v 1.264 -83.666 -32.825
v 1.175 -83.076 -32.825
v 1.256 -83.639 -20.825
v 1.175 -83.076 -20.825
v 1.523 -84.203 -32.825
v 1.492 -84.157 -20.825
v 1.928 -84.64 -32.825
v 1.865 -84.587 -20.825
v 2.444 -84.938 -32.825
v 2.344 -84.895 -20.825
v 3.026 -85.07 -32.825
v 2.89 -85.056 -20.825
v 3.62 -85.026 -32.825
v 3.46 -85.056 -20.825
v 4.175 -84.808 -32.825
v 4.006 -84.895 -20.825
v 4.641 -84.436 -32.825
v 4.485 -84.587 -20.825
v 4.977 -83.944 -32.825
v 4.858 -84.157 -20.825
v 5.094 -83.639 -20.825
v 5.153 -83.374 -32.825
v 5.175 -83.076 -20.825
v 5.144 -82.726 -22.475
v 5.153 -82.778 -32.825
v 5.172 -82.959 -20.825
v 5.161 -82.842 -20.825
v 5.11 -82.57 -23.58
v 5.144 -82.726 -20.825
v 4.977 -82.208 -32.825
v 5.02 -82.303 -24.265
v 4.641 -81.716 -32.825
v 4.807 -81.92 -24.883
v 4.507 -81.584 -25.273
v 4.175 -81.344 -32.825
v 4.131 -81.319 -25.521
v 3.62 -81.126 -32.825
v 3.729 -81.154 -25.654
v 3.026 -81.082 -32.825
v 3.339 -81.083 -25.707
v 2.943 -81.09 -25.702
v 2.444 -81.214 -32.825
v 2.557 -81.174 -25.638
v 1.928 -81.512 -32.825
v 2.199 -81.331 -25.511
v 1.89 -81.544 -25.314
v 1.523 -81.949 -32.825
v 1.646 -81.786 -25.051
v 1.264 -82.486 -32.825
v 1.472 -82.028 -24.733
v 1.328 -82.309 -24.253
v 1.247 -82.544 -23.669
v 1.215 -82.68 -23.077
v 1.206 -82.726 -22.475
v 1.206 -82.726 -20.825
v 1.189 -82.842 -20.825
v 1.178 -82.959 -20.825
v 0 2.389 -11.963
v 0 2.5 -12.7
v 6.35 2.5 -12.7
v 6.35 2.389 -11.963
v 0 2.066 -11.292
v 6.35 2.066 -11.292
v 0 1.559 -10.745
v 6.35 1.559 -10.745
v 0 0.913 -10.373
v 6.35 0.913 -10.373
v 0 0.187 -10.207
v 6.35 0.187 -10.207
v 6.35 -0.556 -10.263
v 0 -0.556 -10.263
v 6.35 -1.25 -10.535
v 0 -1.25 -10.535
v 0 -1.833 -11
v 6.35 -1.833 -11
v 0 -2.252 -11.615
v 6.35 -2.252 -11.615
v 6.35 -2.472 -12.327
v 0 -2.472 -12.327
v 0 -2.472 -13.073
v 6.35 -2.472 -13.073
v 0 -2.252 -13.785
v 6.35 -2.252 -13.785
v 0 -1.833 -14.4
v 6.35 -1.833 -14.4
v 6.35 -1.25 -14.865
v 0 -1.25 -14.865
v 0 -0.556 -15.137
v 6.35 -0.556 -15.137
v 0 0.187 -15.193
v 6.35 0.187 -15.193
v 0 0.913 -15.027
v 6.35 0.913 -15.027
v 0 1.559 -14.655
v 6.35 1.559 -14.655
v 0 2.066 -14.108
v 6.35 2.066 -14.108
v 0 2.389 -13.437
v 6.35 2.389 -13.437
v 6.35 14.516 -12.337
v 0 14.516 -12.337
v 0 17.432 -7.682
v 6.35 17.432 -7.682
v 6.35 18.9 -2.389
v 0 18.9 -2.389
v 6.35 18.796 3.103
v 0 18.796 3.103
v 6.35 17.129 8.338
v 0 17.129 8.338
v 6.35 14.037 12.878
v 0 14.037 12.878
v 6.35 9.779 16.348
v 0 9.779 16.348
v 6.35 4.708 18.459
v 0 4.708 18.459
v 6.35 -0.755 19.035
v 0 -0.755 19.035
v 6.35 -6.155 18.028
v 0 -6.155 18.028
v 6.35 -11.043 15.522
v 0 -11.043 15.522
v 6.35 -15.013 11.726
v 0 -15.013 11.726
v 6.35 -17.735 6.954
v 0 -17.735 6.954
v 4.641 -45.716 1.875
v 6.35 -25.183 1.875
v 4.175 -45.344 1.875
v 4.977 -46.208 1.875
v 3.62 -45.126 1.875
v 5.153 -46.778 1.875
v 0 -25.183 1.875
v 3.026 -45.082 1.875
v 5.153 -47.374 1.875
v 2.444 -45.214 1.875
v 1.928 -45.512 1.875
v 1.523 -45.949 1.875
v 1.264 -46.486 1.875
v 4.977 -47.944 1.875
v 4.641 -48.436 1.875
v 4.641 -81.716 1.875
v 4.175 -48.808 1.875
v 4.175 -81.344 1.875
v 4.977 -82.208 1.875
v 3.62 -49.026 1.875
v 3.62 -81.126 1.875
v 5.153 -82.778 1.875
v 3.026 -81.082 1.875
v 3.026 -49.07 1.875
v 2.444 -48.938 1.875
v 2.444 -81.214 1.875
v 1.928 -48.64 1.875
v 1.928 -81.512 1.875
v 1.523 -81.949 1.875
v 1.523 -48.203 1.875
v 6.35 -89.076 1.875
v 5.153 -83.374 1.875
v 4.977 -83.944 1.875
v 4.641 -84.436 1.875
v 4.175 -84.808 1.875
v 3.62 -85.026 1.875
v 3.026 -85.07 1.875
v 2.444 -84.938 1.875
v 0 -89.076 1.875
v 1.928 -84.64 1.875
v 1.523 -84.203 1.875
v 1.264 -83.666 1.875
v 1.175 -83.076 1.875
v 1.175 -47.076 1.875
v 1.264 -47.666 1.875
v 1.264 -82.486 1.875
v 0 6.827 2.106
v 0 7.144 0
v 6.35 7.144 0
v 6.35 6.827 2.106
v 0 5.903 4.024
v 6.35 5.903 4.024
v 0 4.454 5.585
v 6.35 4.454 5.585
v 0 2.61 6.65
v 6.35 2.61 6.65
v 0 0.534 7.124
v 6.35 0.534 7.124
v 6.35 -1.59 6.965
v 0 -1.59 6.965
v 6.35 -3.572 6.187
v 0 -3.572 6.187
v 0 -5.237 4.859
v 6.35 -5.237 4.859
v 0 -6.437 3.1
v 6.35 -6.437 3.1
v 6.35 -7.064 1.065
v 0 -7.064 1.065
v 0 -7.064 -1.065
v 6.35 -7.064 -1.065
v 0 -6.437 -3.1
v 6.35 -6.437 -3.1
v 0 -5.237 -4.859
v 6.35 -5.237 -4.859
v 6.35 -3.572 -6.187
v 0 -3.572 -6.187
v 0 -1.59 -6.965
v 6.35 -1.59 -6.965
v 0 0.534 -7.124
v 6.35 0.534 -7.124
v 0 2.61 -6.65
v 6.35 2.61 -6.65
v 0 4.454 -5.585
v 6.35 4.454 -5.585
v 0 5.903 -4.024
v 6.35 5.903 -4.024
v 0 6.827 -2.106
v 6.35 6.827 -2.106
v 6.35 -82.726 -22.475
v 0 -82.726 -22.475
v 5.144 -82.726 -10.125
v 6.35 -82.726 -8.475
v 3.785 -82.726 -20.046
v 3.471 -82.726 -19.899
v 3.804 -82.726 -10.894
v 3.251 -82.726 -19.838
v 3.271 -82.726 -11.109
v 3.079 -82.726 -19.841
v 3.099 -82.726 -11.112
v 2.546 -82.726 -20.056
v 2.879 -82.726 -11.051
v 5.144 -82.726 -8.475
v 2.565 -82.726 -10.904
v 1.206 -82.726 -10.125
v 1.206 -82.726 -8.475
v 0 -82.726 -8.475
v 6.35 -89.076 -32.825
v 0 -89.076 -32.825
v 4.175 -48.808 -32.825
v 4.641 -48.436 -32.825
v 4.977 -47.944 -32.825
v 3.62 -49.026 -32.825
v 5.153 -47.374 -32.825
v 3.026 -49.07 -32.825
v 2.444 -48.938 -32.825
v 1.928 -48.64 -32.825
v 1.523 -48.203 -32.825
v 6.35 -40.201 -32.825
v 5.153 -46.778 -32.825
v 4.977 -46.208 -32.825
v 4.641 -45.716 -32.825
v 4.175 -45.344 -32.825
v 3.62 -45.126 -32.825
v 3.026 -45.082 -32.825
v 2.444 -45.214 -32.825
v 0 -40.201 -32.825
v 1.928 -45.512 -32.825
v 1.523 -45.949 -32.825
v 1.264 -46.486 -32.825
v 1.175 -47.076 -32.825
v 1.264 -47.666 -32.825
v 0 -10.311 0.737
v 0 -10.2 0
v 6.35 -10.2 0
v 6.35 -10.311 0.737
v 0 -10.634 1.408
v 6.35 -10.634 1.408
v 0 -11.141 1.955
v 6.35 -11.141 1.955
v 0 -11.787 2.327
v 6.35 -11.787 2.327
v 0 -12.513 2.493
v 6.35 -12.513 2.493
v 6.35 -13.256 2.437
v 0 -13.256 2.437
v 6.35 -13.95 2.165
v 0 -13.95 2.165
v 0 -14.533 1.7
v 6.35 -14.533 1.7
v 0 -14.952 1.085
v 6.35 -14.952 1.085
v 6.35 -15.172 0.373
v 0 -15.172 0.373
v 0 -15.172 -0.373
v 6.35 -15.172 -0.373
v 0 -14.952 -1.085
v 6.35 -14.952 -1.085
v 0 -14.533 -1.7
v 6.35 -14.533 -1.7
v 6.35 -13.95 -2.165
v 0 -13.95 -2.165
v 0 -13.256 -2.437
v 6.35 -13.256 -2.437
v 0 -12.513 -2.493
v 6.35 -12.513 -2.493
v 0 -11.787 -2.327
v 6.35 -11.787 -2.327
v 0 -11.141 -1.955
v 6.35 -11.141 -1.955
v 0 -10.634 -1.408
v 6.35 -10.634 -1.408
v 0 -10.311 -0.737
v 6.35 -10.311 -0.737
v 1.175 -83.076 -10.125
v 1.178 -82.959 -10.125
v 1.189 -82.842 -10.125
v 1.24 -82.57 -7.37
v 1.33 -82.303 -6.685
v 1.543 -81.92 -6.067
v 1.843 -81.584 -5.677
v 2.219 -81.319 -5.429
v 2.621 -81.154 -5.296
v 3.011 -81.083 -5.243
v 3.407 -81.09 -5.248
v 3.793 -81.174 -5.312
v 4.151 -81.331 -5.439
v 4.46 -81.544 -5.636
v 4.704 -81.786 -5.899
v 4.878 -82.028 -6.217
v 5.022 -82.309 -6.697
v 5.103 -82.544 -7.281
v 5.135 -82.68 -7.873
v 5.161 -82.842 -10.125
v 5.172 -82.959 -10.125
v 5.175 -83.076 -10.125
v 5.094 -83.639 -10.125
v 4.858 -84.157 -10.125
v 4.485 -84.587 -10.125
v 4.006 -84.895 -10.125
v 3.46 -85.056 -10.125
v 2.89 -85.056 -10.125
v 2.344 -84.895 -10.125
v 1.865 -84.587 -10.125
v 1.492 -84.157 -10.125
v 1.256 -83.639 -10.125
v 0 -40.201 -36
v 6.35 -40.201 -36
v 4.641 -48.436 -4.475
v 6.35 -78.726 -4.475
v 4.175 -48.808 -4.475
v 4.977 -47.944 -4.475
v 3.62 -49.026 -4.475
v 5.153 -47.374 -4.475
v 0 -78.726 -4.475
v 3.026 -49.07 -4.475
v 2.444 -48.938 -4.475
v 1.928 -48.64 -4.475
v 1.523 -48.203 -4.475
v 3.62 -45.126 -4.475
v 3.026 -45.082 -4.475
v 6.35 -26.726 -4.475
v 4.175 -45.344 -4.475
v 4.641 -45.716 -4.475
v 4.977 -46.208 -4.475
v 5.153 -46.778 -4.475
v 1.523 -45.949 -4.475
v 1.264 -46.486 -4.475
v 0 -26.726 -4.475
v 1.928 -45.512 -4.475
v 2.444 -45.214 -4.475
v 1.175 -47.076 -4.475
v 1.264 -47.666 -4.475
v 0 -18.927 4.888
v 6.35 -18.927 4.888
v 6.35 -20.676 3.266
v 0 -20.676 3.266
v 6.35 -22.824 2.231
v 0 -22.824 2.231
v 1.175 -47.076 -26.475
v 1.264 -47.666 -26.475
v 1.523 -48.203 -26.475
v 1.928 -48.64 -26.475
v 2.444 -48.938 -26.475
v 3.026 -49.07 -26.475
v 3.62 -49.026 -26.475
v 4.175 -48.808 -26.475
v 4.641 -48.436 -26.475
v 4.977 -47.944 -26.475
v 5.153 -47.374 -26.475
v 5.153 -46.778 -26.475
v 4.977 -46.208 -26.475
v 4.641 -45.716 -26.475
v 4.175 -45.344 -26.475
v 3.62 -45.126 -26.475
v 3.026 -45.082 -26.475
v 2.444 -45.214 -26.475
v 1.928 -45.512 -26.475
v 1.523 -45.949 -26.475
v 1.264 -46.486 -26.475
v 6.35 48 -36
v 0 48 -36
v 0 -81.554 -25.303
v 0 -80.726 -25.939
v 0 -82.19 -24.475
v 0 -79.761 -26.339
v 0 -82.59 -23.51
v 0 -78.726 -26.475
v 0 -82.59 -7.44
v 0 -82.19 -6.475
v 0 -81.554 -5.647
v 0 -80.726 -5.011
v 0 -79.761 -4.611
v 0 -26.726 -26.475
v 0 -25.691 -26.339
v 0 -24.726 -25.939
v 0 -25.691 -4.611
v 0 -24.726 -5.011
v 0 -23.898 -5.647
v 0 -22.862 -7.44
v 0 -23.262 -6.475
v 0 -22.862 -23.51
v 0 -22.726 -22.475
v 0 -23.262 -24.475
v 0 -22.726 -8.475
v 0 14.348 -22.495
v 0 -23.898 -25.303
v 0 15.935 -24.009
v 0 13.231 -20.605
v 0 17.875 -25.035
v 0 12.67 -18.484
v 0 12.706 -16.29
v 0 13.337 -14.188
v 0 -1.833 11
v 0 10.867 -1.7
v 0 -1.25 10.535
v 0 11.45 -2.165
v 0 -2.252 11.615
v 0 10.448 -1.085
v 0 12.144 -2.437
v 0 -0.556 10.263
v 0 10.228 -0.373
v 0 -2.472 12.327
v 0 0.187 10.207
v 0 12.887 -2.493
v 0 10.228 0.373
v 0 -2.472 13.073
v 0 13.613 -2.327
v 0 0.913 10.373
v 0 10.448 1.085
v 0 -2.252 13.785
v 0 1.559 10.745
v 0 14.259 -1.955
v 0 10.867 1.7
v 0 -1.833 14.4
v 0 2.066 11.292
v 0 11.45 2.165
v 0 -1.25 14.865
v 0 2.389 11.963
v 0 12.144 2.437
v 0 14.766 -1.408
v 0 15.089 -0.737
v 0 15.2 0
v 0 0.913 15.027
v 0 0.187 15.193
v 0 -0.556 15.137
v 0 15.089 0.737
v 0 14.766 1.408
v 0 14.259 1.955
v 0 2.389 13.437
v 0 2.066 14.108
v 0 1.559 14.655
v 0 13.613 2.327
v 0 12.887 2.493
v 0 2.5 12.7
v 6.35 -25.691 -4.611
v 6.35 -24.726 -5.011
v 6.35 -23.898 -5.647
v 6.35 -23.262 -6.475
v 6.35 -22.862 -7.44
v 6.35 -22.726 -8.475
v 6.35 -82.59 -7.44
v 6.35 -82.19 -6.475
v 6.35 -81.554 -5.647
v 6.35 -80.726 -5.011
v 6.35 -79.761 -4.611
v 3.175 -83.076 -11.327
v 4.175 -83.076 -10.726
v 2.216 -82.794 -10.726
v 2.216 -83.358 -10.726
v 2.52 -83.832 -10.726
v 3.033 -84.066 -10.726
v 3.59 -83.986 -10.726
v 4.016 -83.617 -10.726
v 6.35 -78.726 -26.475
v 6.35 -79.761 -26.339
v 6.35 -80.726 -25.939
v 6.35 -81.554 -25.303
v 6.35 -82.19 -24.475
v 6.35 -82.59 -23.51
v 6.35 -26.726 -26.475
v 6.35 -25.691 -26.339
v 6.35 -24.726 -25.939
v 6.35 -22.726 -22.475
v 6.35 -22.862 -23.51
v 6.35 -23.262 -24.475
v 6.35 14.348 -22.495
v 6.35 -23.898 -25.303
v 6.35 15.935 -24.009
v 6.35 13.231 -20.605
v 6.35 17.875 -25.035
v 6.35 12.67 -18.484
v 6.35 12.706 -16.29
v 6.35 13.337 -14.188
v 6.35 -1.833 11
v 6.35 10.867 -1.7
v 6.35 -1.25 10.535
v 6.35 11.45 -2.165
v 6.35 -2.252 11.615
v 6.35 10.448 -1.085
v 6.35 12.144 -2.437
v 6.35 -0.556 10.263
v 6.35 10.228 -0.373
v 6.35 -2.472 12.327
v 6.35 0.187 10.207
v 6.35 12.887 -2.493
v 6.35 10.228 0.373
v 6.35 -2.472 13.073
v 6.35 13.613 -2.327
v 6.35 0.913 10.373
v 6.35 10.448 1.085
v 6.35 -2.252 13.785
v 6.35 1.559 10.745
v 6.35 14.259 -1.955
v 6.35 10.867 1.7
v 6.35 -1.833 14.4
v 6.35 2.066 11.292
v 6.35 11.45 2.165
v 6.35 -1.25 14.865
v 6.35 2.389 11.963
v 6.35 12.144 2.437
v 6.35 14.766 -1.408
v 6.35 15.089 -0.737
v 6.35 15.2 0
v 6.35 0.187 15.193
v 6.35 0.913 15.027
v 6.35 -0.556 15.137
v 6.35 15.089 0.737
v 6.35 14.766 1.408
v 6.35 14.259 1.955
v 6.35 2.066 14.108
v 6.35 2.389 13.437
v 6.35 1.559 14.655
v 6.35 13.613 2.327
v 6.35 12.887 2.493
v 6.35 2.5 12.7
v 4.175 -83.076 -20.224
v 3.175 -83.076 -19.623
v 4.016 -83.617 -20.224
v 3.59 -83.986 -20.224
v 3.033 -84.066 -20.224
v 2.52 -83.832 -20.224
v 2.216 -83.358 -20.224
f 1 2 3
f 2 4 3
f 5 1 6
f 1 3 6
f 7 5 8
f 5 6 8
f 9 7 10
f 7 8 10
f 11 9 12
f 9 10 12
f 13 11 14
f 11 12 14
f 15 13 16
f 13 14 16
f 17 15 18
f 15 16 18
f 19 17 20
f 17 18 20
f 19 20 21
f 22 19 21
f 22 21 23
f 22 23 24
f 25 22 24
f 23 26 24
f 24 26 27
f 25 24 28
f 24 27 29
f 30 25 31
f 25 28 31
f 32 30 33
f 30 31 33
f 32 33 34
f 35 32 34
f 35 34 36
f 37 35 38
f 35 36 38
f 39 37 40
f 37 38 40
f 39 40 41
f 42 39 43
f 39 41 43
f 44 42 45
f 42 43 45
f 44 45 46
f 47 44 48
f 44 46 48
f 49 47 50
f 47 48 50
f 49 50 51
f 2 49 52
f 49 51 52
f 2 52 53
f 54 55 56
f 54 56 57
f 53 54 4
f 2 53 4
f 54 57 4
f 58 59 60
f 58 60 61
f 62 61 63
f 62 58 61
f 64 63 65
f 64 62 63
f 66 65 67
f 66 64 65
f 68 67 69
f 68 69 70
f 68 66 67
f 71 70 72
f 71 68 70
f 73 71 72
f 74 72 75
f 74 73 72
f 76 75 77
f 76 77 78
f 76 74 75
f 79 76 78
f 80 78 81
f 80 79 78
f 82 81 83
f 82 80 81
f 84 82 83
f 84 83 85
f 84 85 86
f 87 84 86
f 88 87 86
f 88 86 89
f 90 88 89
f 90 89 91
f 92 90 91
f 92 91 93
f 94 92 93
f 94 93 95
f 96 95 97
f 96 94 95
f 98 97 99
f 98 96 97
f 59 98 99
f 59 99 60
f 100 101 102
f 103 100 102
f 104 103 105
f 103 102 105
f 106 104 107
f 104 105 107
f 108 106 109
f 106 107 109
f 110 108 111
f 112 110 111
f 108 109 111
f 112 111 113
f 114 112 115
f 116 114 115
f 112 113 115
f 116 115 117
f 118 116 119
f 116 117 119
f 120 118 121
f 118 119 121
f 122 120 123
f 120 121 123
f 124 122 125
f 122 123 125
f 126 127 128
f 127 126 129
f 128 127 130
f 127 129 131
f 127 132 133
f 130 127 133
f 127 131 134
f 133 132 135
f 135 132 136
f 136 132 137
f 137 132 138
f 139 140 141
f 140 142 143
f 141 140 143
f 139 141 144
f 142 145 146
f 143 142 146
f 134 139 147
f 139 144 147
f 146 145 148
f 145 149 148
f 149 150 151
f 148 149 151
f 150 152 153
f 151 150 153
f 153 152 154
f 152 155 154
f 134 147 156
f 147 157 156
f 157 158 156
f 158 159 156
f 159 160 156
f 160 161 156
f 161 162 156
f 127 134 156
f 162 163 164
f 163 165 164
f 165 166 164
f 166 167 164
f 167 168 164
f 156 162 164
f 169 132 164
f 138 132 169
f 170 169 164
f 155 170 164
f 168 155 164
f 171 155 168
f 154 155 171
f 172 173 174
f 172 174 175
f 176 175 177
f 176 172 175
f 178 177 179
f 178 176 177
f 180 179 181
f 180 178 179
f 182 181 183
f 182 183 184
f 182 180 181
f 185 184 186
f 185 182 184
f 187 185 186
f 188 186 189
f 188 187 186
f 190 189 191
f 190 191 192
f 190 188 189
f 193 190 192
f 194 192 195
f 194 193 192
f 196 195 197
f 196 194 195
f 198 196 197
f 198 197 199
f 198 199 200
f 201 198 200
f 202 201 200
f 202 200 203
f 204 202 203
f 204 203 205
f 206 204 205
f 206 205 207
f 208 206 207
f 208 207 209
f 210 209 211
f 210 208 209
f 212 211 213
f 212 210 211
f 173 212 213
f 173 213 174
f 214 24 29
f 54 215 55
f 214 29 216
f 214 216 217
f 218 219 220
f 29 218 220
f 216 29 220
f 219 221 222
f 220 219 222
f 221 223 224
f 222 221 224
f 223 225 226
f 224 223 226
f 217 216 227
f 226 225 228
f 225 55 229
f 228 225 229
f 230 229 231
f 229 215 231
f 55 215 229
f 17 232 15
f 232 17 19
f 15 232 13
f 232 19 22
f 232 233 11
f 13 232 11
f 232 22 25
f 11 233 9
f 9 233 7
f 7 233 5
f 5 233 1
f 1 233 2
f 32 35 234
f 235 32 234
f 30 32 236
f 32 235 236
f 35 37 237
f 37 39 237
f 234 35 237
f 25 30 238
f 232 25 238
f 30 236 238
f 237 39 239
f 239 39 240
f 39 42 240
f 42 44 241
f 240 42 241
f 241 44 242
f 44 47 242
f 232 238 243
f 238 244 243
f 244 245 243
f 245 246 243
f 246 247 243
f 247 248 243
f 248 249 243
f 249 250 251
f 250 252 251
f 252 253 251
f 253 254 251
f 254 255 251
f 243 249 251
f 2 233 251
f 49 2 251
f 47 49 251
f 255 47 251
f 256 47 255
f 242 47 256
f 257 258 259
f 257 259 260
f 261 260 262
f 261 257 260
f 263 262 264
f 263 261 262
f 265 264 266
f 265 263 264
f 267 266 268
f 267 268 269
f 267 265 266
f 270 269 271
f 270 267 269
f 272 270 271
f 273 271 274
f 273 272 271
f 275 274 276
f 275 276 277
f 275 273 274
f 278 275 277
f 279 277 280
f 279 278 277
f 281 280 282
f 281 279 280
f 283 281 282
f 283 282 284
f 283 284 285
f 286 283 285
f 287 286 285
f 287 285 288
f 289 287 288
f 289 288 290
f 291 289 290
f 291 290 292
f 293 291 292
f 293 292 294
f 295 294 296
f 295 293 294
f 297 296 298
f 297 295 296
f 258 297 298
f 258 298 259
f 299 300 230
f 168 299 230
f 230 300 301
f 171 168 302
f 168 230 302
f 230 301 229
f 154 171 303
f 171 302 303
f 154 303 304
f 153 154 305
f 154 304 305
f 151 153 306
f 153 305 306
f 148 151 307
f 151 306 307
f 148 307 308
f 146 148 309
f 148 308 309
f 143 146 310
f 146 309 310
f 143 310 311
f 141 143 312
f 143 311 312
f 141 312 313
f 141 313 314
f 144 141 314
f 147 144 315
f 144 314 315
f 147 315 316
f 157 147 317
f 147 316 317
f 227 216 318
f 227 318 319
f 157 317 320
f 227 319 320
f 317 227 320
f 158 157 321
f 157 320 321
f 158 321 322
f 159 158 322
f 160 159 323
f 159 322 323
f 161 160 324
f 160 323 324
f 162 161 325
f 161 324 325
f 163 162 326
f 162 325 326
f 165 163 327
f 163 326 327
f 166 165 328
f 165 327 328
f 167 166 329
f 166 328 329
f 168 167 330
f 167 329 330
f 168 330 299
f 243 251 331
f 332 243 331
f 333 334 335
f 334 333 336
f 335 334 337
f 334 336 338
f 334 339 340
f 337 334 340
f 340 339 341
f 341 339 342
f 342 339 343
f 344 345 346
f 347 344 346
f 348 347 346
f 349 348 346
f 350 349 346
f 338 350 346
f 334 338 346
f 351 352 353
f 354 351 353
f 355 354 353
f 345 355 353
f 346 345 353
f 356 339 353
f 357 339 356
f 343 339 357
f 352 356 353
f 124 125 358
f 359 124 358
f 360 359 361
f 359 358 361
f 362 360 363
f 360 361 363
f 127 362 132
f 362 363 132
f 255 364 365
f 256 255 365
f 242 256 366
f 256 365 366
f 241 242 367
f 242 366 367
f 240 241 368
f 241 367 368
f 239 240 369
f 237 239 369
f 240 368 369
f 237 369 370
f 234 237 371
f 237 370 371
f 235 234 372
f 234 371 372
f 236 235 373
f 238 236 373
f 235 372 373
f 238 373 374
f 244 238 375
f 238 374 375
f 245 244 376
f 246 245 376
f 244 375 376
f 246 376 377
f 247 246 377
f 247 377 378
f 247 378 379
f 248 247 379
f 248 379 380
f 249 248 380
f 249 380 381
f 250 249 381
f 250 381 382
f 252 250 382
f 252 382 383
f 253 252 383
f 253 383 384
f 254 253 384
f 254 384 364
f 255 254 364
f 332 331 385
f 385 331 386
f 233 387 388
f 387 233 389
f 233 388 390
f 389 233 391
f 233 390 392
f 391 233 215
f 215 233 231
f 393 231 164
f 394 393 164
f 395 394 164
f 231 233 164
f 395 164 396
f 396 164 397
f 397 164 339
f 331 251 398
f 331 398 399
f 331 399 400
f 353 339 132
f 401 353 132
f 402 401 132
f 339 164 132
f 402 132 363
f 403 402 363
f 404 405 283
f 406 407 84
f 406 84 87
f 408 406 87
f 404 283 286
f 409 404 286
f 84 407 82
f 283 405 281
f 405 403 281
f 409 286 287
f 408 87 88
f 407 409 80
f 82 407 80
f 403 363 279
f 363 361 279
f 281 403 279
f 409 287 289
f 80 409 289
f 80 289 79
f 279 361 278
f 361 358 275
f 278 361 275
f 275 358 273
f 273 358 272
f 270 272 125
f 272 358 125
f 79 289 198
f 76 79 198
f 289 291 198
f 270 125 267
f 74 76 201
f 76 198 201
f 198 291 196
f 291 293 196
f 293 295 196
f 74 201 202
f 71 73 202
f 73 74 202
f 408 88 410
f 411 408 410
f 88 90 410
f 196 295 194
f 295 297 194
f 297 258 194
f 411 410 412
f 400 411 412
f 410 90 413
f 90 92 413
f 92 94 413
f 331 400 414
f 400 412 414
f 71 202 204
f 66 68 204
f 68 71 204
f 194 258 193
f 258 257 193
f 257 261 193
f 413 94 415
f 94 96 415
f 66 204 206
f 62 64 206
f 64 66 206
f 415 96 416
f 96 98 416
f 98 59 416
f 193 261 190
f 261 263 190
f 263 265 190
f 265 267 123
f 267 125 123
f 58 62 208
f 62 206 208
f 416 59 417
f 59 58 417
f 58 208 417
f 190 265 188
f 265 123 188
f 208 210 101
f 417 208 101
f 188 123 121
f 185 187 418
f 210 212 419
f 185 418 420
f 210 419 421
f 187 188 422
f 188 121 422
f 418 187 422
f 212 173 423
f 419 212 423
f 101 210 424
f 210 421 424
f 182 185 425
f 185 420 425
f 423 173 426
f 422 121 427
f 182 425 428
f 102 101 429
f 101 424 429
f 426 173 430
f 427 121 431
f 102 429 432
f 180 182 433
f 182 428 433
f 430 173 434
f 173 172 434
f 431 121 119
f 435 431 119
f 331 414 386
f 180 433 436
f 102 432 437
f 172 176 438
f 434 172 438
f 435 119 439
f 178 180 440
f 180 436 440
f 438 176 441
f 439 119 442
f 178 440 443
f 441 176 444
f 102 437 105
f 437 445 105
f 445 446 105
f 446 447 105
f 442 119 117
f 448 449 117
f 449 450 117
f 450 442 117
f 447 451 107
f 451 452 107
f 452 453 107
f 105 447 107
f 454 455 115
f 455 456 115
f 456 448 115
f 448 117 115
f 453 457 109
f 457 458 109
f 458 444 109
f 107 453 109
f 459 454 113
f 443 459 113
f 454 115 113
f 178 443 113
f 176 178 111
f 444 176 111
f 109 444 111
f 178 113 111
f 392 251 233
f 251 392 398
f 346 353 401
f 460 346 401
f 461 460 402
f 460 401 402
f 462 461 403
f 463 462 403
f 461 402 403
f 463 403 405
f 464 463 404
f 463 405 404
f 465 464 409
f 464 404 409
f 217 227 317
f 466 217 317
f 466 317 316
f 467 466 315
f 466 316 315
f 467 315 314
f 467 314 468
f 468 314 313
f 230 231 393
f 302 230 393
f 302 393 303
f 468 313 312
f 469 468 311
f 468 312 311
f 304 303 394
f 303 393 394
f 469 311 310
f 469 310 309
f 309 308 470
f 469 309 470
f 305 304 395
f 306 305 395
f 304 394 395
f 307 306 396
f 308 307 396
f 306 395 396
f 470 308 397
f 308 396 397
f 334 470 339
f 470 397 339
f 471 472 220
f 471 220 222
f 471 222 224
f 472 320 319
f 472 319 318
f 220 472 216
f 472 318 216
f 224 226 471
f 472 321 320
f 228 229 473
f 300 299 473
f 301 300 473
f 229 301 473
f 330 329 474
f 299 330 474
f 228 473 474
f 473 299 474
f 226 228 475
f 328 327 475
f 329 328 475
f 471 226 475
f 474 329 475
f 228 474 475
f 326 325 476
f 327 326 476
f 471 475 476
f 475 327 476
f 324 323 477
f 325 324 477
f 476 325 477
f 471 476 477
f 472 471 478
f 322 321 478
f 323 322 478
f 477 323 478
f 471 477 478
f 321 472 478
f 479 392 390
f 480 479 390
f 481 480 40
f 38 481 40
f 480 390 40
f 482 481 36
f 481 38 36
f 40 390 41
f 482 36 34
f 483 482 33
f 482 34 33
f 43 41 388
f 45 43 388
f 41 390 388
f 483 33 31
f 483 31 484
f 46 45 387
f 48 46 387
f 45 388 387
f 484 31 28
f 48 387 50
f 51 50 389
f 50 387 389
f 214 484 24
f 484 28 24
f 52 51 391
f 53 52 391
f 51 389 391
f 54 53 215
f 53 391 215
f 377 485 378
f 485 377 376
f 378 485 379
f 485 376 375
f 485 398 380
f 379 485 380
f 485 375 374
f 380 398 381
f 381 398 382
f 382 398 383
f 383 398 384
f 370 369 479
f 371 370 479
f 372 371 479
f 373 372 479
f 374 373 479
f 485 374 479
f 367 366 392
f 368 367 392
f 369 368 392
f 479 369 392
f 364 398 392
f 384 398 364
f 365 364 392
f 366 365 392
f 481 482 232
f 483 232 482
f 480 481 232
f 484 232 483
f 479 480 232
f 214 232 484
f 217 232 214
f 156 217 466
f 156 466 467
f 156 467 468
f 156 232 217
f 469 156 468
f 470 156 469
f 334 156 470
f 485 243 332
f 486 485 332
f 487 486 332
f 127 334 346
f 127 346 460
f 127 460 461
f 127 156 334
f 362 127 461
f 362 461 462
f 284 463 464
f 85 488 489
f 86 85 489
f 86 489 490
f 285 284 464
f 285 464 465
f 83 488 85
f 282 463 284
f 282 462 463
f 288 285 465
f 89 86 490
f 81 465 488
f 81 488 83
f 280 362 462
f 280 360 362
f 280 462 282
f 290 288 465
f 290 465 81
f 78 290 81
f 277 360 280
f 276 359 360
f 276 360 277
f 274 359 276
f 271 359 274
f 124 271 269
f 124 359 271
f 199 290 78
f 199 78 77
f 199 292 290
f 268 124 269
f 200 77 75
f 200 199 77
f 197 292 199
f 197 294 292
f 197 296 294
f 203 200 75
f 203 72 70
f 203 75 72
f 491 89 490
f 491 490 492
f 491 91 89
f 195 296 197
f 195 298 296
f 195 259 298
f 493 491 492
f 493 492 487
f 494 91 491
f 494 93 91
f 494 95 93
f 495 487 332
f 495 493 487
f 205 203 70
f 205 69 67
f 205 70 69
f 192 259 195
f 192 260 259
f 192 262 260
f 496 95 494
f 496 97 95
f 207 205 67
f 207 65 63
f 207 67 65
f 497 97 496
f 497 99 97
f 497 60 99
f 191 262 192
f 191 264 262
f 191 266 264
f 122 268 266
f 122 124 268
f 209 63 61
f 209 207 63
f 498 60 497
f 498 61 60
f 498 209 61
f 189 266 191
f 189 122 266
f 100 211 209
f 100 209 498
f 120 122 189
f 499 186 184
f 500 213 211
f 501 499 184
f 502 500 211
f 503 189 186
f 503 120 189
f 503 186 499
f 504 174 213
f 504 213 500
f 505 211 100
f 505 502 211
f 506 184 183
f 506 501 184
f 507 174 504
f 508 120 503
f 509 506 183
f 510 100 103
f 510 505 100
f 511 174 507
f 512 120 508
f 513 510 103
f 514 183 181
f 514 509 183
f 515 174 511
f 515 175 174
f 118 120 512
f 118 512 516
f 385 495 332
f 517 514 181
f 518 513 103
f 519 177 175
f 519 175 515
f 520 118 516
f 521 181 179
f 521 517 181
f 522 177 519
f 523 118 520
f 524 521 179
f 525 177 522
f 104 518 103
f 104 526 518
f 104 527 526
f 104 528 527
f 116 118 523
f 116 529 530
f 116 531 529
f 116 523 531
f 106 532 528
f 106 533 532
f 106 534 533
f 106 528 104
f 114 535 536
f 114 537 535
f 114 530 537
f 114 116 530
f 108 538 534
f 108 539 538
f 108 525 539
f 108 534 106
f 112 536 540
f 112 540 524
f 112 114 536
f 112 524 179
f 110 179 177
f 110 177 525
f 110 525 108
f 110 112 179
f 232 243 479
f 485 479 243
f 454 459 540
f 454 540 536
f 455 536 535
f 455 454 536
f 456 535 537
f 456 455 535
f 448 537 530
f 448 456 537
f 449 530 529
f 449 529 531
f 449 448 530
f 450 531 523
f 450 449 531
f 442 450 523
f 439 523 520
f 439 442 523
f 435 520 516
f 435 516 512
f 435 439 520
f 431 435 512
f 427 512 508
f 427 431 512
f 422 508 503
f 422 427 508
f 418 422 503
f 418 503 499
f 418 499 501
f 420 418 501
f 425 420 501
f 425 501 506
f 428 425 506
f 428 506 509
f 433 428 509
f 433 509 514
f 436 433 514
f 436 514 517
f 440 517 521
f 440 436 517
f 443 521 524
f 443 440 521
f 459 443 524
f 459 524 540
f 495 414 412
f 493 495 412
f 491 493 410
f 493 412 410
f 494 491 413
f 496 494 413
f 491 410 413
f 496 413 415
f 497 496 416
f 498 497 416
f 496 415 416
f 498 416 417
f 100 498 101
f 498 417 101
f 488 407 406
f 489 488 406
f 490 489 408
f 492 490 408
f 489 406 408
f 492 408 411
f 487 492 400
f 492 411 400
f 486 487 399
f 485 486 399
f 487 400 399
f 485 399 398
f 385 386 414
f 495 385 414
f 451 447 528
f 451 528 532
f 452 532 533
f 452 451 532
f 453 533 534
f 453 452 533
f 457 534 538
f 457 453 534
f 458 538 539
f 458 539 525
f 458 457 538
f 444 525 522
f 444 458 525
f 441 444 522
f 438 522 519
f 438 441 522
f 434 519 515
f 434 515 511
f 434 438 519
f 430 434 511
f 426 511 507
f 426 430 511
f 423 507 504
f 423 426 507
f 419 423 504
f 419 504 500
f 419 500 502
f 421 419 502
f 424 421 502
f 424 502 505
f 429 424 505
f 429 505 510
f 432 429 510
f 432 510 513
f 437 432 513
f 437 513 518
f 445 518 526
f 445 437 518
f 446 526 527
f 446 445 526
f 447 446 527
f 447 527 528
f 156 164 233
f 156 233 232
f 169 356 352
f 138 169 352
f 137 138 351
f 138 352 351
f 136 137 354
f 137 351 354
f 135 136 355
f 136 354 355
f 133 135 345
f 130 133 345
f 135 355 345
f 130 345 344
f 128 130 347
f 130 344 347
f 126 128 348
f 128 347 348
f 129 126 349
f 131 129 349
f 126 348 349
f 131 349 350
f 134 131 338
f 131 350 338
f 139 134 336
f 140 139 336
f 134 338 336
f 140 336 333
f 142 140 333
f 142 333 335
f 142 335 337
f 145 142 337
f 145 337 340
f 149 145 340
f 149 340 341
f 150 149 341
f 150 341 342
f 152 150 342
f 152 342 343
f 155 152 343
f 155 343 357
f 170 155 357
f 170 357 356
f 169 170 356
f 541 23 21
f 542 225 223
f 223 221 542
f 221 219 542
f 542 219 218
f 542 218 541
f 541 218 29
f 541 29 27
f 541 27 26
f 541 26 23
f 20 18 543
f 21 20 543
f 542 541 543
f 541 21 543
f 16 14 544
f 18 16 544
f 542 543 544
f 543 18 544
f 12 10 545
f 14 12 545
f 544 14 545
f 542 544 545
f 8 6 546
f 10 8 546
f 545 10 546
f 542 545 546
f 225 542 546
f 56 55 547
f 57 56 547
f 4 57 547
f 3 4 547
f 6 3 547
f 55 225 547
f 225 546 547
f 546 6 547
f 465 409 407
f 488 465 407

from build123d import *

# Parameters (mm, degrees)
F0_R     = 2.5
F0_R_2   = 7.144
F1_DEPTH = 6.35
F2_W     = 6.35
F2_H     = 38
F3_DEPTH = 37.876
F5_D     = 4
F5_DEPTH = 12
F5_TIP   = 1.2017212381
F7_D     = 4
F7_DEPTH = 12
F7_TIP   = 1.2017212381


with BuildPart() as f1:
    # F0 (on Right) → F1 (new body)
    with BuildSketch(Plane.YZ):
        with BuildLine():
            ThreePointArc((17.8751346366, -25.0354456965), (12.8773903734, -19.5640491806), (14.5155336292, -12.3370086917))
            ThreePointArc((14.5155336292, -12.3370086917), (9.7791608288, 16.348410121), (-17.735210007, 6.9544824399))
            ThreePointArc((-17.735210007, 6.9544824399), (-20.675525796, 3.2657587243), (-25.1830672278, 1.875))
            Line((-25.1830672278, 1.875), (-127.076, 1.875))
            Line((-127.076, 1.875), (-127.076, -4.475))
            Line((-127.076, -4.475), (-93.076, -4.475))
            ThreePointArc((-93.076, -4.475), (-90.2475728753, -5.6465728753), (-89.076, -8.475))
            Line((-89.076, -8.475), (-89.076, -22.475))
            ThreePointArc((-89.076, -22.475), (-90.2475728753, -25.3034271247), (-93.076, -26.475))
            Line((-93.076, -26.475), (-127.076, -26.475))
            Line((-127.076, -26.475), (-127.076, -32.825))
            Line((-127.076, -32.825), (-40.201, -32.825))
            Line((-40.201, -32.825), (-40.201, -36))
            Line((-40.201, -36), (48, -36))
            Line((48, -36), (17.8751346366, -25.0354456965))
        make_face()
        with BuildLine():
            ThreePointArc((-82.726, -8.475), (-81.5544271247, -5.6465728753), (-78.726, -4.475))
            Line((-78.726, -4.475), (-26.726, -4.475))
            ThreePointArc((-26.726, -4.475), (-23.8975728753, -5.6465728753), (-22.726, -8.475))
            Line((-22.726, -8.475), (-22.726, -22.475))
            ThreePointArc((-22.726, -22.475), (-23.8975728753, -25.3034271247), (-26.726, -26.475))
            Line((-26.726, -26.475), (-78.726, -26.475))
            ThreePointArc((-78.726, -26.475), (-81.5544271247, -25.3034271247), (-82.726, -22.475))
            Line((-82.726, -22.475), (-82.726, -8.475))
        make_face(mode=Mode.SUBTRACT)
        with Locations((0, -12.7)):
            Circle(F0_R, mode=Mode.SUBTRACT)
        with Locations((-12.7, 0)):
            Circle(F0_R, mode=Mode.SUBTRACT)
        Circle(F0_R_2, mode=Mode.SUBTRACT)
        with Locations((12.7, 0)):
            Circle(F0_R, mode=Mode.SUBTRACT)
        with Locations((0, 12.7)):
            Circle(F0_R, mode=Mode.SUBTRACT)
    extrude(amount=F1_DEPTH)

    # F2 (on face) → F3 (cut, through all)
    with BuildSketch(Plane.XY.offset(1.875)):
        with Locations((3.175, -108.076)):
            Rectangle(F2_W, F2_H)
    extrude(amount=-F3_DEPTH, mode=Mode.SUBTRACT)

    # F5
    with Locations(Plane.XY.offset(1.875)):
        with Locations((3.175, -83.076), (3.175, -47.076)):
            Hole(F5_D / 2, depth=F5_DEPTH)
            with Locations((0, 0, -(F5_DEPTH + F5_TIP / 2))):  # 118° drill point
                Cone(0, F5_D / 2, F5_TIP, mode=Mode.SUBTRACT)

    # F7
    with Locations(Plane(origin=(0, 0, -32.825), x_dir=(1, 0, 0), z_dir=(0, 0, -1))):
        with Locations((3.175, 83.076), (3.175, 47.076)):
            Hole(F7_D / 2, depth=F7_DEPTH)
            with Locations((0, 0, -(F7_DEPTH + F7_TIP / 2))):  # 118° drill point
                Cone(0, F7_D / 2, F7_TIP, mode=Mode.SUBTRACT)


solid = f1.part
